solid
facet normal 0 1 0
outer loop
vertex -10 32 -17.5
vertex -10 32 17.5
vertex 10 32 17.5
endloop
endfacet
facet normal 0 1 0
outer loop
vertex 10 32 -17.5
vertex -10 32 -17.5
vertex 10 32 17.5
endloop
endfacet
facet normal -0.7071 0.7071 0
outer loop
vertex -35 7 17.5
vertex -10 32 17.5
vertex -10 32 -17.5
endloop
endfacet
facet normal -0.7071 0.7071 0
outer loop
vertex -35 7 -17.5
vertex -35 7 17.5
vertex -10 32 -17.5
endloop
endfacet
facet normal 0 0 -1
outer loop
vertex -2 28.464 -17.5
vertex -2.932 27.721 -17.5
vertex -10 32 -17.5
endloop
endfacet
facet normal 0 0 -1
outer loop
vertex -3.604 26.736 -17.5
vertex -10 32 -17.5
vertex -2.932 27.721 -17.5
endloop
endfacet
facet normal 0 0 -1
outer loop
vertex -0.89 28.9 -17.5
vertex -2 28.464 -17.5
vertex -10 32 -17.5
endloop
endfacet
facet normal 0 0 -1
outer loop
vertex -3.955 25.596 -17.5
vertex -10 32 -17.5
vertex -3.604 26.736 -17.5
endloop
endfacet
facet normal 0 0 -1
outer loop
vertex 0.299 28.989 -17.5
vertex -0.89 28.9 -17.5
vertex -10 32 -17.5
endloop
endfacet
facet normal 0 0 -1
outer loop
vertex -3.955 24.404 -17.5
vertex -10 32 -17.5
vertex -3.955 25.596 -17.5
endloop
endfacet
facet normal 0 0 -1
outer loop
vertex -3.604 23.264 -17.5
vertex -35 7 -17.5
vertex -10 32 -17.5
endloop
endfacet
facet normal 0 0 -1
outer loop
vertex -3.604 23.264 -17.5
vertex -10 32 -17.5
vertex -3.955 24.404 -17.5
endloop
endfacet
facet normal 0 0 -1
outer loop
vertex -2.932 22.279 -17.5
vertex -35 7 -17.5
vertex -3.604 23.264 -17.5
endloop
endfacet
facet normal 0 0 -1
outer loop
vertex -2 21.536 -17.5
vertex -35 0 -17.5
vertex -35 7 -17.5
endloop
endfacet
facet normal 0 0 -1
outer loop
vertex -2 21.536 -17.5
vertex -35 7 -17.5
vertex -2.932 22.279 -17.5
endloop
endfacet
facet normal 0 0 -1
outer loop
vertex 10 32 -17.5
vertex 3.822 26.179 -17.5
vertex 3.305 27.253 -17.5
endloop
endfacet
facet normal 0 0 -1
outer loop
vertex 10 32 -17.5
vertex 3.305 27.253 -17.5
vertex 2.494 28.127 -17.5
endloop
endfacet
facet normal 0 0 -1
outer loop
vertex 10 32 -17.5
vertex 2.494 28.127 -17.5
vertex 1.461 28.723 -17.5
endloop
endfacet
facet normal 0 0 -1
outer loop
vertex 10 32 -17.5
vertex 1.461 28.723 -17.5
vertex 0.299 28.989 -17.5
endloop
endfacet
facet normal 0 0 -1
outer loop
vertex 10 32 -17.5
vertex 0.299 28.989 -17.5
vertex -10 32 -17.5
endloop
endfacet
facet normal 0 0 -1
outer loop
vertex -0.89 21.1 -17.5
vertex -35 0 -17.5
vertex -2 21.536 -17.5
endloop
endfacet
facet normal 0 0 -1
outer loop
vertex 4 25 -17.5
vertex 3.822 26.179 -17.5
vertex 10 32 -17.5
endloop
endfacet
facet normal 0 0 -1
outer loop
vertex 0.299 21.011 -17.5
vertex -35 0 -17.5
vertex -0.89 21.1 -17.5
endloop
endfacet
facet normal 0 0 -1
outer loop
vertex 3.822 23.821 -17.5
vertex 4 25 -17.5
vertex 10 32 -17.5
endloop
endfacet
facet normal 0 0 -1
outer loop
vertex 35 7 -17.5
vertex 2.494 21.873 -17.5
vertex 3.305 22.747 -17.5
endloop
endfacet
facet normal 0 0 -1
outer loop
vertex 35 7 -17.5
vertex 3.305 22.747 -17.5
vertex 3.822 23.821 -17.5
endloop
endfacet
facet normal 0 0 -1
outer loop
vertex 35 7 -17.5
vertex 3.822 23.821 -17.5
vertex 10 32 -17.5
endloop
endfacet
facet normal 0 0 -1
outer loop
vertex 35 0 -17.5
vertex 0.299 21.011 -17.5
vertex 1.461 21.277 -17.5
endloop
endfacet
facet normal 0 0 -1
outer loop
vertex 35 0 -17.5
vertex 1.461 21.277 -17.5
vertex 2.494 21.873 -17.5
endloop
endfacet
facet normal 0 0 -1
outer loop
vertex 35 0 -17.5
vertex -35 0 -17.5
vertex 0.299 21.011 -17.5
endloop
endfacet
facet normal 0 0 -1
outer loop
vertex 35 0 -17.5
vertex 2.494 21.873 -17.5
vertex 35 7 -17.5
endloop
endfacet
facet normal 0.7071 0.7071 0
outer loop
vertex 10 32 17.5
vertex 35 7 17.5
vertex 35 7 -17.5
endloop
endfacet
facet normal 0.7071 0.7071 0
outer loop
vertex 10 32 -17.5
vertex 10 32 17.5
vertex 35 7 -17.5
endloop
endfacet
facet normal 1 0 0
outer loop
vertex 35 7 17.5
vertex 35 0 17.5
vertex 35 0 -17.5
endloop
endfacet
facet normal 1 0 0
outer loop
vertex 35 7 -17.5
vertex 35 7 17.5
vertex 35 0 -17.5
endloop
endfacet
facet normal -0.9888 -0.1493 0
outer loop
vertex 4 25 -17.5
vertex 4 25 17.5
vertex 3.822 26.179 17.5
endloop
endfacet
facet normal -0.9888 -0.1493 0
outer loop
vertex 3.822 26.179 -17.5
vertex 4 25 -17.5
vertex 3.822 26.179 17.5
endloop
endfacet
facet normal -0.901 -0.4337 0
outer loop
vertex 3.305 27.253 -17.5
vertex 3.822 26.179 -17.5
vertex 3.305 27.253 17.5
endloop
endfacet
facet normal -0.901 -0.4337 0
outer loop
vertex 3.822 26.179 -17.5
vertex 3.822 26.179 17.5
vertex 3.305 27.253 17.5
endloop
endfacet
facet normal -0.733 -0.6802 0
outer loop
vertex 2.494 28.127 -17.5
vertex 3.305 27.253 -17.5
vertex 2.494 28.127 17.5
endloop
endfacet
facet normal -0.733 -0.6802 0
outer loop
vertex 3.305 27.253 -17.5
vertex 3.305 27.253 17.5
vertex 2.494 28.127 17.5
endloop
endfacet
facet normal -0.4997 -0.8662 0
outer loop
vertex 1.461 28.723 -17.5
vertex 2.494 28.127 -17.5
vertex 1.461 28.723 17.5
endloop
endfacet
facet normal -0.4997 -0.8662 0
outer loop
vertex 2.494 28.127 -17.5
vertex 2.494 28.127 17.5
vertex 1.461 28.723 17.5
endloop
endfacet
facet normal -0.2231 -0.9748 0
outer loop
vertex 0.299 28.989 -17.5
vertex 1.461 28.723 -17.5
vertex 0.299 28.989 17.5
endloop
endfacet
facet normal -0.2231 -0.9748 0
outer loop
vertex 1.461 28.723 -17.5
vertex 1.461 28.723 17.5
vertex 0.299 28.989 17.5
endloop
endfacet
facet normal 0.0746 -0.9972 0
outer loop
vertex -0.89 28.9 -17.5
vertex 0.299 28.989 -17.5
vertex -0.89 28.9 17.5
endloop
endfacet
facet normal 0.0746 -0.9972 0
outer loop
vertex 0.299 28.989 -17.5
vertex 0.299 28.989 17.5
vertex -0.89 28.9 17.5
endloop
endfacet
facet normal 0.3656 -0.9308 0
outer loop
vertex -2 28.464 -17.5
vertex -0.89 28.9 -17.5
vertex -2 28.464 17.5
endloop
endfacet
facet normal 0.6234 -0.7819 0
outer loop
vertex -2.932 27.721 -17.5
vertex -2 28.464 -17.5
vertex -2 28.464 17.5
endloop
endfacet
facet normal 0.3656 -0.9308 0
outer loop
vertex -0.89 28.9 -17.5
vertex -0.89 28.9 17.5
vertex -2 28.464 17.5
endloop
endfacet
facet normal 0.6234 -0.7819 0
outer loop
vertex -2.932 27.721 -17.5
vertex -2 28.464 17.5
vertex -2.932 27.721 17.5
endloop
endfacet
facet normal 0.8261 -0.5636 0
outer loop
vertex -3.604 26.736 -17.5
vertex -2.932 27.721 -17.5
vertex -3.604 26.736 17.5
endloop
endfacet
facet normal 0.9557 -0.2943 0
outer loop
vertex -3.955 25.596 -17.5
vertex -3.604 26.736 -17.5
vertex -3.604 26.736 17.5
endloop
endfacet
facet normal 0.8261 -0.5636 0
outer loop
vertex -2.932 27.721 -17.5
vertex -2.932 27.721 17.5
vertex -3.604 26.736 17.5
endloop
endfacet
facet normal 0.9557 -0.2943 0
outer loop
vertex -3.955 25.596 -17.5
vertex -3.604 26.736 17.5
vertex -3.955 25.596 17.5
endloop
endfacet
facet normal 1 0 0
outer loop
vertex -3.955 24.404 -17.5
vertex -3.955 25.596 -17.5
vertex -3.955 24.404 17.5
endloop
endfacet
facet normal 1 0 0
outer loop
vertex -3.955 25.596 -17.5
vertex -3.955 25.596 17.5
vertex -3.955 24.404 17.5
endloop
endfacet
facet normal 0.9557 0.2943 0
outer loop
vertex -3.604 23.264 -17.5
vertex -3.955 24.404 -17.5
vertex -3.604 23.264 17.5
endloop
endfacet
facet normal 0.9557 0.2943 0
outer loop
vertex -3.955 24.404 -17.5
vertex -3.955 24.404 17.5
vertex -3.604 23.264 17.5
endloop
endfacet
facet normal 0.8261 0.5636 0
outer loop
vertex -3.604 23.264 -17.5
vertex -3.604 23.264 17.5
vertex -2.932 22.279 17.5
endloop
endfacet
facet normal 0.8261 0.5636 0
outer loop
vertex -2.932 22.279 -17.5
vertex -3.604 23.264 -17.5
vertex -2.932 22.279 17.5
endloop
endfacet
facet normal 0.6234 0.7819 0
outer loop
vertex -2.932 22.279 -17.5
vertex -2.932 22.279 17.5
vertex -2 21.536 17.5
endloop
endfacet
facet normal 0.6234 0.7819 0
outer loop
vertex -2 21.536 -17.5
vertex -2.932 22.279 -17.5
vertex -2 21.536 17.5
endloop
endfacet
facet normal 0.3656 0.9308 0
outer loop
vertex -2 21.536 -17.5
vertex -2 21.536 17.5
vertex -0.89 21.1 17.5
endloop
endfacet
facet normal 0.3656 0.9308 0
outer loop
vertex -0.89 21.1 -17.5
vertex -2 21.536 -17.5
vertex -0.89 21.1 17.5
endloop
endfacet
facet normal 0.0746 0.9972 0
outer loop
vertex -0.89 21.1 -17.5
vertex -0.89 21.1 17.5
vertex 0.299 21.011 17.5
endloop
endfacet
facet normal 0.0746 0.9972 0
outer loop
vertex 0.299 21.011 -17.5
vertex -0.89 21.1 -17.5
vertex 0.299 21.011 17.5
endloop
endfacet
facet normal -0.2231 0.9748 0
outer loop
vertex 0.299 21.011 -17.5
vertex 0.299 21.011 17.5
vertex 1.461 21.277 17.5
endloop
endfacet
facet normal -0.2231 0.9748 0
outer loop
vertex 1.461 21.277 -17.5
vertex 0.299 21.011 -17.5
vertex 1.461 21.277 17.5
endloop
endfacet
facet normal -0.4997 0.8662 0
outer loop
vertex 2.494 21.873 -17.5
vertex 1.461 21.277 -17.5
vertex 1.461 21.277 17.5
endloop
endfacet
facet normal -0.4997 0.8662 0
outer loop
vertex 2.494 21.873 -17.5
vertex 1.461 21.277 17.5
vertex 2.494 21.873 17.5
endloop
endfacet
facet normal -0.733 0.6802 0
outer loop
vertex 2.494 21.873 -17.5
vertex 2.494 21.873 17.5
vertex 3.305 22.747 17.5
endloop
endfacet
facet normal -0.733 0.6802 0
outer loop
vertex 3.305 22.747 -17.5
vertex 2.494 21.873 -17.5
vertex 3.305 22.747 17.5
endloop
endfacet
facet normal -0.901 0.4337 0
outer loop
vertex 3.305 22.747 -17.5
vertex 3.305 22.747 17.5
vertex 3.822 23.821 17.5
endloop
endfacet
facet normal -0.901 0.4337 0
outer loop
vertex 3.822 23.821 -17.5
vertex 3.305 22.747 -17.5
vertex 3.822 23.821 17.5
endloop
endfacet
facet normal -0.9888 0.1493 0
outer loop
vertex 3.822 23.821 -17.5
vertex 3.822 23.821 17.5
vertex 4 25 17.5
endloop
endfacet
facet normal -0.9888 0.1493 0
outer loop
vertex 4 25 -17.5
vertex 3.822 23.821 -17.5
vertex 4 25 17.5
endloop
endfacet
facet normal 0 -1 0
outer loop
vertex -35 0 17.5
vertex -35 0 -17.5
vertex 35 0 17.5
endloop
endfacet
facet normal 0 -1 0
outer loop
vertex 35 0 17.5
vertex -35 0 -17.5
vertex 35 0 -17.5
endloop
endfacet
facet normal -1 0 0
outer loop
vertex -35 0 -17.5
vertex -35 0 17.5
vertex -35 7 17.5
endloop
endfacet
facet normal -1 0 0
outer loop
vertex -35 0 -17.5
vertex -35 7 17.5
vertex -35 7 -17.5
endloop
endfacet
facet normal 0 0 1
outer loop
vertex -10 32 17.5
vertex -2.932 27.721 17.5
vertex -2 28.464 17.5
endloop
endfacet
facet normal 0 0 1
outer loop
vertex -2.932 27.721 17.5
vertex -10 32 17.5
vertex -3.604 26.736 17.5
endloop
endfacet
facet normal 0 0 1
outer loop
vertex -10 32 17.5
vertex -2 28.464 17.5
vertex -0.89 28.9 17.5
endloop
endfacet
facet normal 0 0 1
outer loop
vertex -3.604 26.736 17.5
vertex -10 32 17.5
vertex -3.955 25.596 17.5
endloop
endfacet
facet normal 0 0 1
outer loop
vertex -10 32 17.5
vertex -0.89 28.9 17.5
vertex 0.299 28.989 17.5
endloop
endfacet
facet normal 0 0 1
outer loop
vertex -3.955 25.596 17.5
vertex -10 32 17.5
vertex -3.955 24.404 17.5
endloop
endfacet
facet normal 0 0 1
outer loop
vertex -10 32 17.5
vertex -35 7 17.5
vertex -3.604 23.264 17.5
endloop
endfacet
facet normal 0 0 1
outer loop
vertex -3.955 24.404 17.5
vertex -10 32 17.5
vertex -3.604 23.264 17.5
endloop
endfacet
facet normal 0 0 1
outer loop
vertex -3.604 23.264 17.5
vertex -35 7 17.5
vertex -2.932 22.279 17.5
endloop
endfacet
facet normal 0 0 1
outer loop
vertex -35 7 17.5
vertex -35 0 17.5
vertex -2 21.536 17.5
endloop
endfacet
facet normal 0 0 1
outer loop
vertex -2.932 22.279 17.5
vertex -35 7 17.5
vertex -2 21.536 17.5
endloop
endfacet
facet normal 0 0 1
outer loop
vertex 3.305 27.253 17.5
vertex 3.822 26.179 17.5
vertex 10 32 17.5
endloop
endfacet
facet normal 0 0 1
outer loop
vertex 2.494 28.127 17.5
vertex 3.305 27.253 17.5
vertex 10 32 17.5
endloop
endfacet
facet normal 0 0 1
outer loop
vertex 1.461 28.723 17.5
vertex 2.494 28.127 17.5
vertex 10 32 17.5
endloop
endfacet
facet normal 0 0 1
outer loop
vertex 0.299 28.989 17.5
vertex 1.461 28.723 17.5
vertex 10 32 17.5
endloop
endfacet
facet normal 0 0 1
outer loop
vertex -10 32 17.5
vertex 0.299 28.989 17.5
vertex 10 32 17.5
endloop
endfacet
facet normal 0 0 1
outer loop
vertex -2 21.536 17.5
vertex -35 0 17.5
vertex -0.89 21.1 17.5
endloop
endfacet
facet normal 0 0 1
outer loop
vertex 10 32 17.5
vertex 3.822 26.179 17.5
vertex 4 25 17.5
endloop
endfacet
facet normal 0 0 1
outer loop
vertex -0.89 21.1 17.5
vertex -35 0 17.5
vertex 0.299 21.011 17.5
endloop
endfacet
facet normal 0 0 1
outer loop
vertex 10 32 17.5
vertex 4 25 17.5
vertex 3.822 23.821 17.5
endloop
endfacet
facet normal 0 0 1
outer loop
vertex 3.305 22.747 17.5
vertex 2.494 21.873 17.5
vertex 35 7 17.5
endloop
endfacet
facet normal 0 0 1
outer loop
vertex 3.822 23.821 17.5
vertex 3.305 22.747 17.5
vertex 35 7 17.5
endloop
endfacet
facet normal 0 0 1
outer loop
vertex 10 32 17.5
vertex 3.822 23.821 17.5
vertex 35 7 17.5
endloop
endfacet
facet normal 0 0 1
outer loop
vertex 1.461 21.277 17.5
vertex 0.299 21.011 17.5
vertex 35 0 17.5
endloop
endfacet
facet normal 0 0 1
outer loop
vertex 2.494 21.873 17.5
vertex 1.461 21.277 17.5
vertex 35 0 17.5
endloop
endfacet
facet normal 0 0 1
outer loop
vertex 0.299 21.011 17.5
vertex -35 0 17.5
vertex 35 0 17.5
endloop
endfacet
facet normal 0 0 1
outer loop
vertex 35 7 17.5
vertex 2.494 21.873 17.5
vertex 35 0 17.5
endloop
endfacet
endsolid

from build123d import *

# Parameters (mm, degrees)
SKETCH1_W           = 70
SKETCH1_H           = 35
BOSS_EXTRUDE1_DEPTH = 32
SKETCH2_R           = 4
CUT_EXTRUDE1_DEPTH  = 59.940648113
CHAMFER1_SIZE       = 25


with BuildPart() as part:
    # Sketch1 → Boss-Extrude1 (new body)
    with BuildSketch(Plane(origin=(0, 0, 0), x_dir=(1, 0, 0), z_dir=(0, 1, 0))):
        Rectangle(SKETCH1_W, SKETCH1_H)
    extrude(amount=BOSS_EXTRUDE1_DEPTH)

    # Sketch2 → Cut-Extrude1 (cut, through all)
    with BuildSketch(Plane.XY.offset(17.5)):
        with Locations((0, 25)):
            Circle(SKETCH2_R)
    extrude(amount=-CUT_EXTRUDE1_DEPTH, mode=Mode.SUBTRACT)

    # Chamfer1
    chamfer1_edges = [part.edges().sort_by_distance(p)[0] for p in [
        (-35, 32, 0),
        (35, 32, 0),
    ]]
    chamfer(chamfer1_edges, length=CHAMFER1_SIZE)


solid = part.part
